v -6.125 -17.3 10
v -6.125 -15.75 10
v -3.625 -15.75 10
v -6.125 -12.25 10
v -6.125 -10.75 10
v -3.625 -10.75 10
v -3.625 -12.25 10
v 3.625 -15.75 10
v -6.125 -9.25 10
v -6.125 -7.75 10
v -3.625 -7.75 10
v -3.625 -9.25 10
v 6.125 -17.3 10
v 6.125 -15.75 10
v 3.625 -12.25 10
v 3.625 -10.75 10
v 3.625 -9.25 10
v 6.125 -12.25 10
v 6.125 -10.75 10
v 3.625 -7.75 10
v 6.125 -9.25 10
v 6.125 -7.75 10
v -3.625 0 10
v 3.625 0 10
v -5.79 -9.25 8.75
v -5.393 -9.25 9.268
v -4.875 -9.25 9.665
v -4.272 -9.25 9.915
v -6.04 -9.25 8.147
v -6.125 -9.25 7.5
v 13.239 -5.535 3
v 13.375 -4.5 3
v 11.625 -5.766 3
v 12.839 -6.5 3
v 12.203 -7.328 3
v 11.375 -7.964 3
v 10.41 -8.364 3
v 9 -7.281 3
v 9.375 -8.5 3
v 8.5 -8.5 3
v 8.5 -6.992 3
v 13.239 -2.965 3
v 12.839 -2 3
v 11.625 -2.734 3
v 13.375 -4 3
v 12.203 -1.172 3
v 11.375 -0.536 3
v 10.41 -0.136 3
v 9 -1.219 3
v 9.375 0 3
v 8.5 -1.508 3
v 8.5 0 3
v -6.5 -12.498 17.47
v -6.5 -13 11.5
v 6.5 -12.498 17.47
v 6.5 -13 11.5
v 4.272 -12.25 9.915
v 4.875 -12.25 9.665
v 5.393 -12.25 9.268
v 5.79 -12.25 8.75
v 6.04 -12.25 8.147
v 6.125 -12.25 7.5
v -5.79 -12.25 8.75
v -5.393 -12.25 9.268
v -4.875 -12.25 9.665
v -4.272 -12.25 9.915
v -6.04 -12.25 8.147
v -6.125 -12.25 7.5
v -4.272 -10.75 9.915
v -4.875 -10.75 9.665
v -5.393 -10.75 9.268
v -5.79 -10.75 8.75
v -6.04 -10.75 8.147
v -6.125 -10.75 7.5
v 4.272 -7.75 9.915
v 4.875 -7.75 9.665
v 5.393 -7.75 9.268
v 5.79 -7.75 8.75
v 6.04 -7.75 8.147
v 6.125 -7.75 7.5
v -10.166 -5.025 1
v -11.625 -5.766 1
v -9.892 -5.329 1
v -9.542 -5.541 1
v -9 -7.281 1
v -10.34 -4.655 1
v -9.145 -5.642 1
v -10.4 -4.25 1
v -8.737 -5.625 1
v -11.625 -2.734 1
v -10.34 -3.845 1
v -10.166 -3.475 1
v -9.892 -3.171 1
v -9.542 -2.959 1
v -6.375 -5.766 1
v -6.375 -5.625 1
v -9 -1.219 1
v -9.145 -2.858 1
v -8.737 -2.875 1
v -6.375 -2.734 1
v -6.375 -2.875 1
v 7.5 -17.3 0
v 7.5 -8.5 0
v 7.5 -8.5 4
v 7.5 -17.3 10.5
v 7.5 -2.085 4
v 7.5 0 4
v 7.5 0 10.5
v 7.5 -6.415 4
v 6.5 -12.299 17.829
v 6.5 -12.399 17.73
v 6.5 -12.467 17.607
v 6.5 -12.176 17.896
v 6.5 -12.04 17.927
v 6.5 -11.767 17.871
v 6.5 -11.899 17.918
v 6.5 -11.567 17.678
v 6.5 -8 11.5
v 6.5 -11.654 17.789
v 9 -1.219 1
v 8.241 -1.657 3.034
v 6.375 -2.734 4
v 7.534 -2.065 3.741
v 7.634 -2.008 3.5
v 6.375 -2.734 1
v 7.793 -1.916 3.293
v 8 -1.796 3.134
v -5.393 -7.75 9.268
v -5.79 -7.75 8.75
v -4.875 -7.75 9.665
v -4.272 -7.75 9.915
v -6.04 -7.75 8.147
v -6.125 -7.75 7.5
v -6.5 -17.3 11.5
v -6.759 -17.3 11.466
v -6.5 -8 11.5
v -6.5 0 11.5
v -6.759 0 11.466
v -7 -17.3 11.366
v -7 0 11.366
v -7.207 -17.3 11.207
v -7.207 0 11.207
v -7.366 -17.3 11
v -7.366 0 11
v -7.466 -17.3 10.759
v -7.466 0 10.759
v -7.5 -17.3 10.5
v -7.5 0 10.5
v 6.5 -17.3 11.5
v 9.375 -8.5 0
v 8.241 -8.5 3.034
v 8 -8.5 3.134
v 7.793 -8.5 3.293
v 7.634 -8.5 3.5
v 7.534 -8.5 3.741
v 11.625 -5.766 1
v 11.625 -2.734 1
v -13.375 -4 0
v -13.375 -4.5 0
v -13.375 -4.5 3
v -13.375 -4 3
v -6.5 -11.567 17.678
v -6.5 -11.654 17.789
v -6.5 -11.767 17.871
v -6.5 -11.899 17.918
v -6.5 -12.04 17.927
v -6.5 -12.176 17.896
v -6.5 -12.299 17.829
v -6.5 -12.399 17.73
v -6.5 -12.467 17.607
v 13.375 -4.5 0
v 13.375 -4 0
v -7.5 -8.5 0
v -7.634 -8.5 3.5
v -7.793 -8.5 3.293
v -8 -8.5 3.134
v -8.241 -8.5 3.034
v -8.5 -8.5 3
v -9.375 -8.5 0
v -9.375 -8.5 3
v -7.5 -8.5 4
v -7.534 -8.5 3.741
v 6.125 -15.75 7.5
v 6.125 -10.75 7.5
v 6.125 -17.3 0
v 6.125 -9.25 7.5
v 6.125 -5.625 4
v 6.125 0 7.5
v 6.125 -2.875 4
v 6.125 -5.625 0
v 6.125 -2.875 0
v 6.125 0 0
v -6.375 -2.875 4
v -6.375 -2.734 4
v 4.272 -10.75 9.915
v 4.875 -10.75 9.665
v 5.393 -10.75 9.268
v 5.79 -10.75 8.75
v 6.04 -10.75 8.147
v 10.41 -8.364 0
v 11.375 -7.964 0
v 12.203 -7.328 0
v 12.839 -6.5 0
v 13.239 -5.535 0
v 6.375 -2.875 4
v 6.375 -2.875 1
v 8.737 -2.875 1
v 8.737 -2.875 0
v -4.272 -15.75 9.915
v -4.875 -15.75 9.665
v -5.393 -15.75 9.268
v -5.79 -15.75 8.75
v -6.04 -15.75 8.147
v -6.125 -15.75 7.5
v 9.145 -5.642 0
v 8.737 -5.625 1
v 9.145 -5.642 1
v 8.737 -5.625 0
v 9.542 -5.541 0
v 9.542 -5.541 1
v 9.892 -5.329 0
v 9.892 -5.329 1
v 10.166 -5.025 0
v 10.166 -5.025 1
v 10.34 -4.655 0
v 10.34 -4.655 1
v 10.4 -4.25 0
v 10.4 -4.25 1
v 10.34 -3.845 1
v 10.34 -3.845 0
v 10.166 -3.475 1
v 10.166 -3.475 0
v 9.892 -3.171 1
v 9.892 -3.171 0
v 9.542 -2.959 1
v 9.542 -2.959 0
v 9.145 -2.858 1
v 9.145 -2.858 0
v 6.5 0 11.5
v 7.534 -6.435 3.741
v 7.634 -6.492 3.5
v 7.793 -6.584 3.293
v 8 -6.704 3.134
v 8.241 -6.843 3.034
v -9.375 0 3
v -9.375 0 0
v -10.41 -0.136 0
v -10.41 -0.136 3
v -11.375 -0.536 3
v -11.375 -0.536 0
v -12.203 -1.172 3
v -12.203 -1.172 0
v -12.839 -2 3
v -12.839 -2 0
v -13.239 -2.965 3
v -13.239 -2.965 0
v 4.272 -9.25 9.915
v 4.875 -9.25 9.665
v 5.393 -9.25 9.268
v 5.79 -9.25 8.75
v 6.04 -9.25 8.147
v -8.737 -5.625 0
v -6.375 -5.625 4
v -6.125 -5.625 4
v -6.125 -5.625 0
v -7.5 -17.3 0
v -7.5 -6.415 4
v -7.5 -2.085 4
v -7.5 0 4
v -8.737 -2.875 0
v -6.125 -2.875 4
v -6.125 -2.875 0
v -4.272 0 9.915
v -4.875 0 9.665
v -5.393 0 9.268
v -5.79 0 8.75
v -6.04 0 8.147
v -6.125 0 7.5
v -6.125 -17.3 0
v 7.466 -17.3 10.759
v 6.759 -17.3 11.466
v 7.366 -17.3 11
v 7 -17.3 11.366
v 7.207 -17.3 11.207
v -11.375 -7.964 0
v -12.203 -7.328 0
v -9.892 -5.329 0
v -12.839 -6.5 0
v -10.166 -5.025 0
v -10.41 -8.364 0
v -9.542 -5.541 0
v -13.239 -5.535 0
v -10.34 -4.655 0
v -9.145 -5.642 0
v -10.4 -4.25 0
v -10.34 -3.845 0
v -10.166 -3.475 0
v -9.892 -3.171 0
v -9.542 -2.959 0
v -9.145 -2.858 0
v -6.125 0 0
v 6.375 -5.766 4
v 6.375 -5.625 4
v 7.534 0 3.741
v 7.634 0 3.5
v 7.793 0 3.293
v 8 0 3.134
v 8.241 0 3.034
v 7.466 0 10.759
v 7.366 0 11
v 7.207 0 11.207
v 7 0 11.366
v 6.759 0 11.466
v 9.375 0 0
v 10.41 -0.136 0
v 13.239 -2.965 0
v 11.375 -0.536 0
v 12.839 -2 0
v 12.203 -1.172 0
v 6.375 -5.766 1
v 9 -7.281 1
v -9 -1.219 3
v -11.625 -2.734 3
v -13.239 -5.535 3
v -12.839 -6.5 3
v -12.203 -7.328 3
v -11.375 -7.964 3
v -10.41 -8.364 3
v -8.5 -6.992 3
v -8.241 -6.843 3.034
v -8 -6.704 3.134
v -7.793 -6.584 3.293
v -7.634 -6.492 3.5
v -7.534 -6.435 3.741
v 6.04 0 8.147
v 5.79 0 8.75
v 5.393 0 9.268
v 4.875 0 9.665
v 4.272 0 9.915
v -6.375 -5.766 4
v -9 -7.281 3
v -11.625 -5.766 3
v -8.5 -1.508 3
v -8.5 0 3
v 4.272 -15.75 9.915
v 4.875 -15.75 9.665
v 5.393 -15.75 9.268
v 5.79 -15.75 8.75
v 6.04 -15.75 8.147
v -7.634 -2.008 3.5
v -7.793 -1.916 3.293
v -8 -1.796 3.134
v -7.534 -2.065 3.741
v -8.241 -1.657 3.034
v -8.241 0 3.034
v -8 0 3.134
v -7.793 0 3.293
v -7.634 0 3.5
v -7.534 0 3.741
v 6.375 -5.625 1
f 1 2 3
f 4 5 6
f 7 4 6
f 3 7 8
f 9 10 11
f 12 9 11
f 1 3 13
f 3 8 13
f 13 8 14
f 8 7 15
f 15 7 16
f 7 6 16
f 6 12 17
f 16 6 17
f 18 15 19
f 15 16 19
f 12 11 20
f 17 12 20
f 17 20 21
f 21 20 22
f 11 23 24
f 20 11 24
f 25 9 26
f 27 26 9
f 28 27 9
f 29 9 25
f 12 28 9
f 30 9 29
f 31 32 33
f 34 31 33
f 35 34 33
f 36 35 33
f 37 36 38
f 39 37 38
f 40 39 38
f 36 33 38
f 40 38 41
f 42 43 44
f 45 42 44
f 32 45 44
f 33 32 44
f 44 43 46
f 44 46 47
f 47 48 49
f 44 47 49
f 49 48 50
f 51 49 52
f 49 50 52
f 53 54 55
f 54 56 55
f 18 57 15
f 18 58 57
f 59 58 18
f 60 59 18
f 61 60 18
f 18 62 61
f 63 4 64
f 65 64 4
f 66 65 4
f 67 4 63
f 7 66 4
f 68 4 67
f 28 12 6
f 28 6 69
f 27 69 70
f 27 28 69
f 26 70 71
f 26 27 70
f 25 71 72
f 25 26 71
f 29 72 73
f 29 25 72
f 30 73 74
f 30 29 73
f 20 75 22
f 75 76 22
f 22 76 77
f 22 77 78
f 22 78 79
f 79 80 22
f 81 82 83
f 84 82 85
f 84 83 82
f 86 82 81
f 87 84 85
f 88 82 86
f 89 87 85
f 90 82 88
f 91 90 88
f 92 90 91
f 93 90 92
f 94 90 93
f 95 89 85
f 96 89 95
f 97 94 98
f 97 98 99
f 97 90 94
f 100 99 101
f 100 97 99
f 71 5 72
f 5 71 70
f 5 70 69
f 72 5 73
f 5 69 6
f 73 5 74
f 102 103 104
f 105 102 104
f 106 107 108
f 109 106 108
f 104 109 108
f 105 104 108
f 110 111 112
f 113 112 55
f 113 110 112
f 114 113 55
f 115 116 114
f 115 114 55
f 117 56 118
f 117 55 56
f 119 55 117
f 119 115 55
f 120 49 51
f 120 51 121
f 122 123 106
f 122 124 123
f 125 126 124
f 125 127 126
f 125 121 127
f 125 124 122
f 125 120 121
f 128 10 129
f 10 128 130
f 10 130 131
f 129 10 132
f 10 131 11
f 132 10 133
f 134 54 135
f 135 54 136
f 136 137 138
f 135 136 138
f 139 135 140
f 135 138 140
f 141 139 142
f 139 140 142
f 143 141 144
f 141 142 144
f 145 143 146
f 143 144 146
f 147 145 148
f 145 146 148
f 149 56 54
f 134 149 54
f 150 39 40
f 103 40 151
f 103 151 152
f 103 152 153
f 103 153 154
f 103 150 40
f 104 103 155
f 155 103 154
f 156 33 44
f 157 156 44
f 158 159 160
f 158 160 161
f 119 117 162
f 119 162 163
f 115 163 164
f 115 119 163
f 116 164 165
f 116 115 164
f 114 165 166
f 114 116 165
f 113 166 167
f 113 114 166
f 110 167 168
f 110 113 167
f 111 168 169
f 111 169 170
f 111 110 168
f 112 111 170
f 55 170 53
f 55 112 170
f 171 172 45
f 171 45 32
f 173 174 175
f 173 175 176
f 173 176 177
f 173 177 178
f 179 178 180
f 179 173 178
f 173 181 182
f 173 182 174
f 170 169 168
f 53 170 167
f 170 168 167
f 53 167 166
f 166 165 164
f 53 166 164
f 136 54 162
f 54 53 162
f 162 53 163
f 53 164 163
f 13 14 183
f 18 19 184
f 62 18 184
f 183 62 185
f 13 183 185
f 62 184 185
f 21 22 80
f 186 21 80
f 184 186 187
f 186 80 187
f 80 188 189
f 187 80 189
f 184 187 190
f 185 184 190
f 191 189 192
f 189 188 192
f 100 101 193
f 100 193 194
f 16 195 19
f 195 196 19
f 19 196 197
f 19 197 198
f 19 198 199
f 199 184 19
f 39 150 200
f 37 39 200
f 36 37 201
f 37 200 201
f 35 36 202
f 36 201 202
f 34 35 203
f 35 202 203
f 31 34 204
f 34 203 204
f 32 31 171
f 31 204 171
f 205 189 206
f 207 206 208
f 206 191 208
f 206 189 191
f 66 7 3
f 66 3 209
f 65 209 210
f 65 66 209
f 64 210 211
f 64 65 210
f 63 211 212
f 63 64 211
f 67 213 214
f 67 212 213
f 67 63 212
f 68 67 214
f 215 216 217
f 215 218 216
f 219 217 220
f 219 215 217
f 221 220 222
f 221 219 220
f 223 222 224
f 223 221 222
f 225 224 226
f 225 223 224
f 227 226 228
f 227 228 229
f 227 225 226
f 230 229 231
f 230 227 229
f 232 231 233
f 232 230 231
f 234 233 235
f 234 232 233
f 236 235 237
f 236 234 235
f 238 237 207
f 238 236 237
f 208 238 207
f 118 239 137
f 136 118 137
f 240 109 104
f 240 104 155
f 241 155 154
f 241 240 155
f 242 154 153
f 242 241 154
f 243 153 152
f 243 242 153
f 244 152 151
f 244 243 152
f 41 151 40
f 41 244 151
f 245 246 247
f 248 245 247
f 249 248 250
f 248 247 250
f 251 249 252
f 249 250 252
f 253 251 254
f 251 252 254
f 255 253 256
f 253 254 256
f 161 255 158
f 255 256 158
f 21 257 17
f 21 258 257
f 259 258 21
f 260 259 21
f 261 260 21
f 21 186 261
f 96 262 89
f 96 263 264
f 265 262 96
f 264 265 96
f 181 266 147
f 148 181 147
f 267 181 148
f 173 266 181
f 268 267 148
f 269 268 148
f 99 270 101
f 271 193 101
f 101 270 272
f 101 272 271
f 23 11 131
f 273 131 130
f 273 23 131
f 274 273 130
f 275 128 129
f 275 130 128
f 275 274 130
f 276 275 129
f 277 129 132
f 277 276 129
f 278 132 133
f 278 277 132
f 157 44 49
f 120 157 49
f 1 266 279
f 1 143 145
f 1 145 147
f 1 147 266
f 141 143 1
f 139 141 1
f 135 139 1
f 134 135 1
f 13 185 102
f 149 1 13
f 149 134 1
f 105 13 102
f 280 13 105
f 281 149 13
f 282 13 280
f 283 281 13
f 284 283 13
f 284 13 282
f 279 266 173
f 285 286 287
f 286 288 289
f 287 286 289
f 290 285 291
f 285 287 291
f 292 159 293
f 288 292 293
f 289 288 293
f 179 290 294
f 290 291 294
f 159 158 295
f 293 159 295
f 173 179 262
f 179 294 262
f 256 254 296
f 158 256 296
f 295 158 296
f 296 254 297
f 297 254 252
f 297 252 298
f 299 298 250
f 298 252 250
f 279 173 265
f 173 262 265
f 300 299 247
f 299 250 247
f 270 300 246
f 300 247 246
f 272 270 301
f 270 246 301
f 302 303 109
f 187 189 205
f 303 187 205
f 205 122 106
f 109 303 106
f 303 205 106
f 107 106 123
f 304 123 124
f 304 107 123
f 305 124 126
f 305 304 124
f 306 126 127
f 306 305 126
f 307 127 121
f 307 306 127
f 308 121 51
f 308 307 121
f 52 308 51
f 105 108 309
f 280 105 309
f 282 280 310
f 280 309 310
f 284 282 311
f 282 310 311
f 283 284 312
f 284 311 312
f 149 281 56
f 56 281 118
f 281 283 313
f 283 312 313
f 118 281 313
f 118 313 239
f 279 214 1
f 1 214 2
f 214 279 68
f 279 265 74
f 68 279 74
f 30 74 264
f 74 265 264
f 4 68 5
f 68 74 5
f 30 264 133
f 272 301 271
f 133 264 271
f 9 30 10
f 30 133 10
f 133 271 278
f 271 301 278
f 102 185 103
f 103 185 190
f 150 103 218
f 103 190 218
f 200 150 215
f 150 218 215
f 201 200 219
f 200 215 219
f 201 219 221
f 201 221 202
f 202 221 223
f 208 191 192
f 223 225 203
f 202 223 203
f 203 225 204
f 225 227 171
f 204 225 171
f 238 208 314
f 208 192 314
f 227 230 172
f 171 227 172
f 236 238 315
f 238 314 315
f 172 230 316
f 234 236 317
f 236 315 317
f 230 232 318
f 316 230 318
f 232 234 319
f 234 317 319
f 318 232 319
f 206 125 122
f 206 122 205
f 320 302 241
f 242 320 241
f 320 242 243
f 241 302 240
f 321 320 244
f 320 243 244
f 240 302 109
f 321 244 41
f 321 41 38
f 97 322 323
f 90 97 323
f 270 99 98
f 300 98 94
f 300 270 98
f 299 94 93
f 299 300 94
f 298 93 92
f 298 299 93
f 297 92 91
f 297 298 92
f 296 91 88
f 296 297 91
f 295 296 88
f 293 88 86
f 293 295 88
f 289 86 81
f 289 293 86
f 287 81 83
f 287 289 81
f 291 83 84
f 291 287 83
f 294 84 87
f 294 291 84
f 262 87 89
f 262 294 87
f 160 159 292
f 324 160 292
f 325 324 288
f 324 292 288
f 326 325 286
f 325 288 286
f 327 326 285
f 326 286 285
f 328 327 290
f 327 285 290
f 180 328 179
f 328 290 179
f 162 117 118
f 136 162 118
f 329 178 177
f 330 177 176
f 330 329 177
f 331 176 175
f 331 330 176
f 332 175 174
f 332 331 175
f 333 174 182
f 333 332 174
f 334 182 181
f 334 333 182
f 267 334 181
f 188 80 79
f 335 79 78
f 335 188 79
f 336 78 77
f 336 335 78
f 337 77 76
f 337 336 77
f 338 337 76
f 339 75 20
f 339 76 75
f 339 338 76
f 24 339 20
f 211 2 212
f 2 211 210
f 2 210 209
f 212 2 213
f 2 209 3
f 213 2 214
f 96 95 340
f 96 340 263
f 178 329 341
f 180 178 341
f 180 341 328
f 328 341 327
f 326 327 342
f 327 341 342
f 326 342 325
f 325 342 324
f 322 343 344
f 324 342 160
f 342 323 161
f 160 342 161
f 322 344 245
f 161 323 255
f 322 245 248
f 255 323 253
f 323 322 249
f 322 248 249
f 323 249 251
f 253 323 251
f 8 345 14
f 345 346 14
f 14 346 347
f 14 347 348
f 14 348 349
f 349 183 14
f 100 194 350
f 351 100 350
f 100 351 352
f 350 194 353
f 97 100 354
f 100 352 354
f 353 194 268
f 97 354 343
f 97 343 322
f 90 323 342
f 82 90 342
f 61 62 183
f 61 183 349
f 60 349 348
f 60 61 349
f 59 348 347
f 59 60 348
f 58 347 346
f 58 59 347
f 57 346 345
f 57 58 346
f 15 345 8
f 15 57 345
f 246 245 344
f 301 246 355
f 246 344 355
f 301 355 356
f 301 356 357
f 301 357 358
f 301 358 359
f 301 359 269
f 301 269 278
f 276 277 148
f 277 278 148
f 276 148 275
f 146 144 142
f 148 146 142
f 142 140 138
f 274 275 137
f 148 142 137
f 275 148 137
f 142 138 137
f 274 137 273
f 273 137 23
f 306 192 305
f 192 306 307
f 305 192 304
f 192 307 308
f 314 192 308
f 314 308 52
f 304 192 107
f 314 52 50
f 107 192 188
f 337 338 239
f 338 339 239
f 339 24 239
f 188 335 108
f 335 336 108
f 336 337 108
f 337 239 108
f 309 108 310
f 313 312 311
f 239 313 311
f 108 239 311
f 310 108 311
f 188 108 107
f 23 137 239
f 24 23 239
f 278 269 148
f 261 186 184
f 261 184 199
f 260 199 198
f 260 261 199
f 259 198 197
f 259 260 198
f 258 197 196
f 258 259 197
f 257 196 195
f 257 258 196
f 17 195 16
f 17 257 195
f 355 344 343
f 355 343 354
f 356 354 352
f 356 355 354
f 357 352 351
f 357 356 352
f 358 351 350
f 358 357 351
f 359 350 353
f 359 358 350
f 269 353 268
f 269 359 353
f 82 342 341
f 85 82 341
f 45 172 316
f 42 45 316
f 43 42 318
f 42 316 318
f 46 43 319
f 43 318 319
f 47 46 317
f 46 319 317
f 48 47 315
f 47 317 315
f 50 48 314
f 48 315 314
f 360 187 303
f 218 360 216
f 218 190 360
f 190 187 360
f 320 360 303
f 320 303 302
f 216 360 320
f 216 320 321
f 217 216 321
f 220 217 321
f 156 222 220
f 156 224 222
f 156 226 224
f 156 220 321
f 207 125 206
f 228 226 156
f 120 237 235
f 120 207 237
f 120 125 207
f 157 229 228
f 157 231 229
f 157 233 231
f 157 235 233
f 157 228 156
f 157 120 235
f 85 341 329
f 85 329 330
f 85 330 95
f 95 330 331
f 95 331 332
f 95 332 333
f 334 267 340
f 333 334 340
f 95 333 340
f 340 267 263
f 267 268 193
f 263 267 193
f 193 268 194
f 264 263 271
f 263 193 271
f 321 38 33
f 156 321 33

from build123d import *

# Parameters (mm, degrees)
PAD015_DEPTH         = 17.3
POCKET009_DEPTH      = 0.001
POCKET009_DEPTH_BACK = 11.501
SKETCH022_R          = 1.4
POCKET007_DEPTH      = 0.001
POCKET007_DEPTH_BACK = 11.501
POCKET008_DEPTH      = 2
POCKET008_DEPTH_BACK = 1
SKETCH026_W          = 18
SKETCH026_H          = 2.75
POCKET006_DEPTH      = 4
SKETCH027_W          = 12.25
SKETCH027_H          = 1.5
SKETCH027_H_2        = 2
POCKET010_DEPTH      = 10
PAD016_DEPTH         = 6.5


with BuildPart() as part:
    # Sketch024 → Pad015 (new body)
    with BuildSketch(Plane.XZ):
        with BuildLine():
            Line((-13.5, 0), (-6.125, 0))
            Line((-6.125, 0), (-6.125, 7.5))
            ThreePointArc((-3.625, 10), (-5.392767, 9.267767), (-6.125, 7.5))
            Line((-3.625, 10), (3.625, 10))
            ThreePointArc((6.125, 7.5), (5.392767, 9.267767), (3.625, 10))
            Line((6.125, 7.5), (6.125, 0))
            Line((6.125, 0), (13.5, 0))
            Line((13.5, 0), (13.5, 3))
            Line((13.5, 3), (8.5, 3))
            ThreePointArc((7.5, 4), (7.792893, 3.292893), (8.5, 3))
            Line((7.5, 4), (7.5, 10.5))
            ThreePointArc((7.5, 10.5), (7.207107, 11.207107), (6.5, 11.5))
            Line((6.5, 11.5), (-6.5, 11.5))
            ThreePointArc((-6.5, 11.5), (-7.207107, 11.207107), (-7.5, 10.5))
            Line((-7.5, 10.5), (-7.5, 4))
            ThreePointArc((-8.5, 3), (-7.792893, 3.292893), (-7.5, 4))
            Line((-8.5, 3), (-13.5, 3))
            Line((-13.5, 3), (-13.5, 0))
        make_face()
    extrude(amount=PAD015_DEPTH)

    # Sketch023 → Pocket009 (cut, two sides)
    with BuildSketch(Plane.XY) as pocket009_sk:
        with BuildLine():
            Line((-9.375, 0), (9.375, 0))
            ThreePointArc((13.375, -4), (12.203427, -1.171573), (9.375, 0))
            Line((13.375, -4), (13.375, -4.5))
            ThreePointArc((9.375, -8.5), (12.203427, -7.328427), (13.375, -4.5))
            Line((9.375, -8.5), (7.5, -8.5))
            Line((7.5, -8.5), (7.5, -29))
            Line((7.5, -29), (15, -29))
            Line((15, -29), (15, 1))
            Line((15, 1), (-15, 1))
            Line((-15, 1), (-15, -29))
            Line((-15, -29), (-7.5, -29))
            Line((-7.5, -29), (-7.5, -8.5))
            Line((-7.5, -8.5), (-9.375, -8.5))
            ThreePointArc((-13.375, -4.5), (-12.203427, -7.328427), (-9.375, -8.5))
            Line((-13.375, -4.5), (-13.375, -4))
            ThreePointArc((-9.375, 0), (-12.203427, -1.171573), (-13.375, -4))
        make_face()
    extrude(amount=-POCKET009_DEPTH, mode=Mode.SUBTRACT)
    extrude(pocket009_sk.sketch, amount=POCKET009_DEPTH_BACK, mode=Mode.SUBTRACT)

    # Sketch022 → Pocket007 (cut, two sides)
    with BuildSketch(Plane.XY) as pocket007_sk:
        with Locations((-9, -4.25)):
            Circle(SKETCH022_R)
        with Locations((9, -4.25)):
            Circle(SKETCH022_R)
    extrude(amount=-POCKET007_DEPTH, mode=Mode.SUBTRACT)
    extrude(pocket007_sk.sketch, amount=POCKET007_DEPTH_BACK, mode=Mode.SUBTRACT)

    # Sketch025 (on DatumPlane) → Pocket008 (cut, two sides)
    with BuildSketch(Plane.XY.offset(3)) as pocket008_sk:
        Polygon((-6.375, -5.765544), (-6.375, -2.734456), (-9, -1.218911), (-11.625, -2.734456), (-11.625, -5.765544), (-9, -7.281089), align=None)
        Polygon((11.625, -5.765544), (11.625, -2.734456), (9, -1.218911), (6.375, -2.734456), (6.375, -5.765544), (9, -7.281089), align=None)
    extrude(amount=-POCKET008_DEPTH, mode=Mode.SUBTRACT)
    extrude(pocket008_sk.sketch, amount=POCKET008_DEPTH_BACK, mode=Mode.SUBTRACT)

    # Sketch026 → Pocket006 (cut)
    with BuildSketch(Plane.XY):
        with Locations((0, -4.25)):
            Rectangle(SKETCH026_W, SKETCH026_H)
    extrude(amount=POCKET006_DEPTH, mode=Mode.SUBTRACT)

    # Sketch027 → Pocket010 (cut)
    with BuildSketch(Plane.XY):
        with Locations((0, -8.5)):
            Rectangle(SKETCH027_W, SKETCH027_H)
        with Locations((0, -11.5)):
            Rectangle(SKETCH027_W, SKETCH027_H)
        with Locations((0, -16.75)):
            Rectangle(SKETCH027_W, SKETCH027_H_2)
    extrude(amount=POCKET010_DEPTH, mode=Mode.SUBTRACT)

    # Sketch028 → Pad016 (join, symmetric)
    with BuildSketch(Plane.YZ):
        with BuildLine():
            Line((-13, 11.5), (-8, 11.5))
            Line((-11.566987, 17.678203), (-8, 11.5))
            ThreePointArc((-11.566987, 17.678203), (-12.109054, 17.916166), (-12.498243, 17.470078))
            Line((-13, 11.5), (-12.498243, 17.470078))
        make_face()
    extrude(amount=PAD016_DEPTH, both=True)


solid = part.part
